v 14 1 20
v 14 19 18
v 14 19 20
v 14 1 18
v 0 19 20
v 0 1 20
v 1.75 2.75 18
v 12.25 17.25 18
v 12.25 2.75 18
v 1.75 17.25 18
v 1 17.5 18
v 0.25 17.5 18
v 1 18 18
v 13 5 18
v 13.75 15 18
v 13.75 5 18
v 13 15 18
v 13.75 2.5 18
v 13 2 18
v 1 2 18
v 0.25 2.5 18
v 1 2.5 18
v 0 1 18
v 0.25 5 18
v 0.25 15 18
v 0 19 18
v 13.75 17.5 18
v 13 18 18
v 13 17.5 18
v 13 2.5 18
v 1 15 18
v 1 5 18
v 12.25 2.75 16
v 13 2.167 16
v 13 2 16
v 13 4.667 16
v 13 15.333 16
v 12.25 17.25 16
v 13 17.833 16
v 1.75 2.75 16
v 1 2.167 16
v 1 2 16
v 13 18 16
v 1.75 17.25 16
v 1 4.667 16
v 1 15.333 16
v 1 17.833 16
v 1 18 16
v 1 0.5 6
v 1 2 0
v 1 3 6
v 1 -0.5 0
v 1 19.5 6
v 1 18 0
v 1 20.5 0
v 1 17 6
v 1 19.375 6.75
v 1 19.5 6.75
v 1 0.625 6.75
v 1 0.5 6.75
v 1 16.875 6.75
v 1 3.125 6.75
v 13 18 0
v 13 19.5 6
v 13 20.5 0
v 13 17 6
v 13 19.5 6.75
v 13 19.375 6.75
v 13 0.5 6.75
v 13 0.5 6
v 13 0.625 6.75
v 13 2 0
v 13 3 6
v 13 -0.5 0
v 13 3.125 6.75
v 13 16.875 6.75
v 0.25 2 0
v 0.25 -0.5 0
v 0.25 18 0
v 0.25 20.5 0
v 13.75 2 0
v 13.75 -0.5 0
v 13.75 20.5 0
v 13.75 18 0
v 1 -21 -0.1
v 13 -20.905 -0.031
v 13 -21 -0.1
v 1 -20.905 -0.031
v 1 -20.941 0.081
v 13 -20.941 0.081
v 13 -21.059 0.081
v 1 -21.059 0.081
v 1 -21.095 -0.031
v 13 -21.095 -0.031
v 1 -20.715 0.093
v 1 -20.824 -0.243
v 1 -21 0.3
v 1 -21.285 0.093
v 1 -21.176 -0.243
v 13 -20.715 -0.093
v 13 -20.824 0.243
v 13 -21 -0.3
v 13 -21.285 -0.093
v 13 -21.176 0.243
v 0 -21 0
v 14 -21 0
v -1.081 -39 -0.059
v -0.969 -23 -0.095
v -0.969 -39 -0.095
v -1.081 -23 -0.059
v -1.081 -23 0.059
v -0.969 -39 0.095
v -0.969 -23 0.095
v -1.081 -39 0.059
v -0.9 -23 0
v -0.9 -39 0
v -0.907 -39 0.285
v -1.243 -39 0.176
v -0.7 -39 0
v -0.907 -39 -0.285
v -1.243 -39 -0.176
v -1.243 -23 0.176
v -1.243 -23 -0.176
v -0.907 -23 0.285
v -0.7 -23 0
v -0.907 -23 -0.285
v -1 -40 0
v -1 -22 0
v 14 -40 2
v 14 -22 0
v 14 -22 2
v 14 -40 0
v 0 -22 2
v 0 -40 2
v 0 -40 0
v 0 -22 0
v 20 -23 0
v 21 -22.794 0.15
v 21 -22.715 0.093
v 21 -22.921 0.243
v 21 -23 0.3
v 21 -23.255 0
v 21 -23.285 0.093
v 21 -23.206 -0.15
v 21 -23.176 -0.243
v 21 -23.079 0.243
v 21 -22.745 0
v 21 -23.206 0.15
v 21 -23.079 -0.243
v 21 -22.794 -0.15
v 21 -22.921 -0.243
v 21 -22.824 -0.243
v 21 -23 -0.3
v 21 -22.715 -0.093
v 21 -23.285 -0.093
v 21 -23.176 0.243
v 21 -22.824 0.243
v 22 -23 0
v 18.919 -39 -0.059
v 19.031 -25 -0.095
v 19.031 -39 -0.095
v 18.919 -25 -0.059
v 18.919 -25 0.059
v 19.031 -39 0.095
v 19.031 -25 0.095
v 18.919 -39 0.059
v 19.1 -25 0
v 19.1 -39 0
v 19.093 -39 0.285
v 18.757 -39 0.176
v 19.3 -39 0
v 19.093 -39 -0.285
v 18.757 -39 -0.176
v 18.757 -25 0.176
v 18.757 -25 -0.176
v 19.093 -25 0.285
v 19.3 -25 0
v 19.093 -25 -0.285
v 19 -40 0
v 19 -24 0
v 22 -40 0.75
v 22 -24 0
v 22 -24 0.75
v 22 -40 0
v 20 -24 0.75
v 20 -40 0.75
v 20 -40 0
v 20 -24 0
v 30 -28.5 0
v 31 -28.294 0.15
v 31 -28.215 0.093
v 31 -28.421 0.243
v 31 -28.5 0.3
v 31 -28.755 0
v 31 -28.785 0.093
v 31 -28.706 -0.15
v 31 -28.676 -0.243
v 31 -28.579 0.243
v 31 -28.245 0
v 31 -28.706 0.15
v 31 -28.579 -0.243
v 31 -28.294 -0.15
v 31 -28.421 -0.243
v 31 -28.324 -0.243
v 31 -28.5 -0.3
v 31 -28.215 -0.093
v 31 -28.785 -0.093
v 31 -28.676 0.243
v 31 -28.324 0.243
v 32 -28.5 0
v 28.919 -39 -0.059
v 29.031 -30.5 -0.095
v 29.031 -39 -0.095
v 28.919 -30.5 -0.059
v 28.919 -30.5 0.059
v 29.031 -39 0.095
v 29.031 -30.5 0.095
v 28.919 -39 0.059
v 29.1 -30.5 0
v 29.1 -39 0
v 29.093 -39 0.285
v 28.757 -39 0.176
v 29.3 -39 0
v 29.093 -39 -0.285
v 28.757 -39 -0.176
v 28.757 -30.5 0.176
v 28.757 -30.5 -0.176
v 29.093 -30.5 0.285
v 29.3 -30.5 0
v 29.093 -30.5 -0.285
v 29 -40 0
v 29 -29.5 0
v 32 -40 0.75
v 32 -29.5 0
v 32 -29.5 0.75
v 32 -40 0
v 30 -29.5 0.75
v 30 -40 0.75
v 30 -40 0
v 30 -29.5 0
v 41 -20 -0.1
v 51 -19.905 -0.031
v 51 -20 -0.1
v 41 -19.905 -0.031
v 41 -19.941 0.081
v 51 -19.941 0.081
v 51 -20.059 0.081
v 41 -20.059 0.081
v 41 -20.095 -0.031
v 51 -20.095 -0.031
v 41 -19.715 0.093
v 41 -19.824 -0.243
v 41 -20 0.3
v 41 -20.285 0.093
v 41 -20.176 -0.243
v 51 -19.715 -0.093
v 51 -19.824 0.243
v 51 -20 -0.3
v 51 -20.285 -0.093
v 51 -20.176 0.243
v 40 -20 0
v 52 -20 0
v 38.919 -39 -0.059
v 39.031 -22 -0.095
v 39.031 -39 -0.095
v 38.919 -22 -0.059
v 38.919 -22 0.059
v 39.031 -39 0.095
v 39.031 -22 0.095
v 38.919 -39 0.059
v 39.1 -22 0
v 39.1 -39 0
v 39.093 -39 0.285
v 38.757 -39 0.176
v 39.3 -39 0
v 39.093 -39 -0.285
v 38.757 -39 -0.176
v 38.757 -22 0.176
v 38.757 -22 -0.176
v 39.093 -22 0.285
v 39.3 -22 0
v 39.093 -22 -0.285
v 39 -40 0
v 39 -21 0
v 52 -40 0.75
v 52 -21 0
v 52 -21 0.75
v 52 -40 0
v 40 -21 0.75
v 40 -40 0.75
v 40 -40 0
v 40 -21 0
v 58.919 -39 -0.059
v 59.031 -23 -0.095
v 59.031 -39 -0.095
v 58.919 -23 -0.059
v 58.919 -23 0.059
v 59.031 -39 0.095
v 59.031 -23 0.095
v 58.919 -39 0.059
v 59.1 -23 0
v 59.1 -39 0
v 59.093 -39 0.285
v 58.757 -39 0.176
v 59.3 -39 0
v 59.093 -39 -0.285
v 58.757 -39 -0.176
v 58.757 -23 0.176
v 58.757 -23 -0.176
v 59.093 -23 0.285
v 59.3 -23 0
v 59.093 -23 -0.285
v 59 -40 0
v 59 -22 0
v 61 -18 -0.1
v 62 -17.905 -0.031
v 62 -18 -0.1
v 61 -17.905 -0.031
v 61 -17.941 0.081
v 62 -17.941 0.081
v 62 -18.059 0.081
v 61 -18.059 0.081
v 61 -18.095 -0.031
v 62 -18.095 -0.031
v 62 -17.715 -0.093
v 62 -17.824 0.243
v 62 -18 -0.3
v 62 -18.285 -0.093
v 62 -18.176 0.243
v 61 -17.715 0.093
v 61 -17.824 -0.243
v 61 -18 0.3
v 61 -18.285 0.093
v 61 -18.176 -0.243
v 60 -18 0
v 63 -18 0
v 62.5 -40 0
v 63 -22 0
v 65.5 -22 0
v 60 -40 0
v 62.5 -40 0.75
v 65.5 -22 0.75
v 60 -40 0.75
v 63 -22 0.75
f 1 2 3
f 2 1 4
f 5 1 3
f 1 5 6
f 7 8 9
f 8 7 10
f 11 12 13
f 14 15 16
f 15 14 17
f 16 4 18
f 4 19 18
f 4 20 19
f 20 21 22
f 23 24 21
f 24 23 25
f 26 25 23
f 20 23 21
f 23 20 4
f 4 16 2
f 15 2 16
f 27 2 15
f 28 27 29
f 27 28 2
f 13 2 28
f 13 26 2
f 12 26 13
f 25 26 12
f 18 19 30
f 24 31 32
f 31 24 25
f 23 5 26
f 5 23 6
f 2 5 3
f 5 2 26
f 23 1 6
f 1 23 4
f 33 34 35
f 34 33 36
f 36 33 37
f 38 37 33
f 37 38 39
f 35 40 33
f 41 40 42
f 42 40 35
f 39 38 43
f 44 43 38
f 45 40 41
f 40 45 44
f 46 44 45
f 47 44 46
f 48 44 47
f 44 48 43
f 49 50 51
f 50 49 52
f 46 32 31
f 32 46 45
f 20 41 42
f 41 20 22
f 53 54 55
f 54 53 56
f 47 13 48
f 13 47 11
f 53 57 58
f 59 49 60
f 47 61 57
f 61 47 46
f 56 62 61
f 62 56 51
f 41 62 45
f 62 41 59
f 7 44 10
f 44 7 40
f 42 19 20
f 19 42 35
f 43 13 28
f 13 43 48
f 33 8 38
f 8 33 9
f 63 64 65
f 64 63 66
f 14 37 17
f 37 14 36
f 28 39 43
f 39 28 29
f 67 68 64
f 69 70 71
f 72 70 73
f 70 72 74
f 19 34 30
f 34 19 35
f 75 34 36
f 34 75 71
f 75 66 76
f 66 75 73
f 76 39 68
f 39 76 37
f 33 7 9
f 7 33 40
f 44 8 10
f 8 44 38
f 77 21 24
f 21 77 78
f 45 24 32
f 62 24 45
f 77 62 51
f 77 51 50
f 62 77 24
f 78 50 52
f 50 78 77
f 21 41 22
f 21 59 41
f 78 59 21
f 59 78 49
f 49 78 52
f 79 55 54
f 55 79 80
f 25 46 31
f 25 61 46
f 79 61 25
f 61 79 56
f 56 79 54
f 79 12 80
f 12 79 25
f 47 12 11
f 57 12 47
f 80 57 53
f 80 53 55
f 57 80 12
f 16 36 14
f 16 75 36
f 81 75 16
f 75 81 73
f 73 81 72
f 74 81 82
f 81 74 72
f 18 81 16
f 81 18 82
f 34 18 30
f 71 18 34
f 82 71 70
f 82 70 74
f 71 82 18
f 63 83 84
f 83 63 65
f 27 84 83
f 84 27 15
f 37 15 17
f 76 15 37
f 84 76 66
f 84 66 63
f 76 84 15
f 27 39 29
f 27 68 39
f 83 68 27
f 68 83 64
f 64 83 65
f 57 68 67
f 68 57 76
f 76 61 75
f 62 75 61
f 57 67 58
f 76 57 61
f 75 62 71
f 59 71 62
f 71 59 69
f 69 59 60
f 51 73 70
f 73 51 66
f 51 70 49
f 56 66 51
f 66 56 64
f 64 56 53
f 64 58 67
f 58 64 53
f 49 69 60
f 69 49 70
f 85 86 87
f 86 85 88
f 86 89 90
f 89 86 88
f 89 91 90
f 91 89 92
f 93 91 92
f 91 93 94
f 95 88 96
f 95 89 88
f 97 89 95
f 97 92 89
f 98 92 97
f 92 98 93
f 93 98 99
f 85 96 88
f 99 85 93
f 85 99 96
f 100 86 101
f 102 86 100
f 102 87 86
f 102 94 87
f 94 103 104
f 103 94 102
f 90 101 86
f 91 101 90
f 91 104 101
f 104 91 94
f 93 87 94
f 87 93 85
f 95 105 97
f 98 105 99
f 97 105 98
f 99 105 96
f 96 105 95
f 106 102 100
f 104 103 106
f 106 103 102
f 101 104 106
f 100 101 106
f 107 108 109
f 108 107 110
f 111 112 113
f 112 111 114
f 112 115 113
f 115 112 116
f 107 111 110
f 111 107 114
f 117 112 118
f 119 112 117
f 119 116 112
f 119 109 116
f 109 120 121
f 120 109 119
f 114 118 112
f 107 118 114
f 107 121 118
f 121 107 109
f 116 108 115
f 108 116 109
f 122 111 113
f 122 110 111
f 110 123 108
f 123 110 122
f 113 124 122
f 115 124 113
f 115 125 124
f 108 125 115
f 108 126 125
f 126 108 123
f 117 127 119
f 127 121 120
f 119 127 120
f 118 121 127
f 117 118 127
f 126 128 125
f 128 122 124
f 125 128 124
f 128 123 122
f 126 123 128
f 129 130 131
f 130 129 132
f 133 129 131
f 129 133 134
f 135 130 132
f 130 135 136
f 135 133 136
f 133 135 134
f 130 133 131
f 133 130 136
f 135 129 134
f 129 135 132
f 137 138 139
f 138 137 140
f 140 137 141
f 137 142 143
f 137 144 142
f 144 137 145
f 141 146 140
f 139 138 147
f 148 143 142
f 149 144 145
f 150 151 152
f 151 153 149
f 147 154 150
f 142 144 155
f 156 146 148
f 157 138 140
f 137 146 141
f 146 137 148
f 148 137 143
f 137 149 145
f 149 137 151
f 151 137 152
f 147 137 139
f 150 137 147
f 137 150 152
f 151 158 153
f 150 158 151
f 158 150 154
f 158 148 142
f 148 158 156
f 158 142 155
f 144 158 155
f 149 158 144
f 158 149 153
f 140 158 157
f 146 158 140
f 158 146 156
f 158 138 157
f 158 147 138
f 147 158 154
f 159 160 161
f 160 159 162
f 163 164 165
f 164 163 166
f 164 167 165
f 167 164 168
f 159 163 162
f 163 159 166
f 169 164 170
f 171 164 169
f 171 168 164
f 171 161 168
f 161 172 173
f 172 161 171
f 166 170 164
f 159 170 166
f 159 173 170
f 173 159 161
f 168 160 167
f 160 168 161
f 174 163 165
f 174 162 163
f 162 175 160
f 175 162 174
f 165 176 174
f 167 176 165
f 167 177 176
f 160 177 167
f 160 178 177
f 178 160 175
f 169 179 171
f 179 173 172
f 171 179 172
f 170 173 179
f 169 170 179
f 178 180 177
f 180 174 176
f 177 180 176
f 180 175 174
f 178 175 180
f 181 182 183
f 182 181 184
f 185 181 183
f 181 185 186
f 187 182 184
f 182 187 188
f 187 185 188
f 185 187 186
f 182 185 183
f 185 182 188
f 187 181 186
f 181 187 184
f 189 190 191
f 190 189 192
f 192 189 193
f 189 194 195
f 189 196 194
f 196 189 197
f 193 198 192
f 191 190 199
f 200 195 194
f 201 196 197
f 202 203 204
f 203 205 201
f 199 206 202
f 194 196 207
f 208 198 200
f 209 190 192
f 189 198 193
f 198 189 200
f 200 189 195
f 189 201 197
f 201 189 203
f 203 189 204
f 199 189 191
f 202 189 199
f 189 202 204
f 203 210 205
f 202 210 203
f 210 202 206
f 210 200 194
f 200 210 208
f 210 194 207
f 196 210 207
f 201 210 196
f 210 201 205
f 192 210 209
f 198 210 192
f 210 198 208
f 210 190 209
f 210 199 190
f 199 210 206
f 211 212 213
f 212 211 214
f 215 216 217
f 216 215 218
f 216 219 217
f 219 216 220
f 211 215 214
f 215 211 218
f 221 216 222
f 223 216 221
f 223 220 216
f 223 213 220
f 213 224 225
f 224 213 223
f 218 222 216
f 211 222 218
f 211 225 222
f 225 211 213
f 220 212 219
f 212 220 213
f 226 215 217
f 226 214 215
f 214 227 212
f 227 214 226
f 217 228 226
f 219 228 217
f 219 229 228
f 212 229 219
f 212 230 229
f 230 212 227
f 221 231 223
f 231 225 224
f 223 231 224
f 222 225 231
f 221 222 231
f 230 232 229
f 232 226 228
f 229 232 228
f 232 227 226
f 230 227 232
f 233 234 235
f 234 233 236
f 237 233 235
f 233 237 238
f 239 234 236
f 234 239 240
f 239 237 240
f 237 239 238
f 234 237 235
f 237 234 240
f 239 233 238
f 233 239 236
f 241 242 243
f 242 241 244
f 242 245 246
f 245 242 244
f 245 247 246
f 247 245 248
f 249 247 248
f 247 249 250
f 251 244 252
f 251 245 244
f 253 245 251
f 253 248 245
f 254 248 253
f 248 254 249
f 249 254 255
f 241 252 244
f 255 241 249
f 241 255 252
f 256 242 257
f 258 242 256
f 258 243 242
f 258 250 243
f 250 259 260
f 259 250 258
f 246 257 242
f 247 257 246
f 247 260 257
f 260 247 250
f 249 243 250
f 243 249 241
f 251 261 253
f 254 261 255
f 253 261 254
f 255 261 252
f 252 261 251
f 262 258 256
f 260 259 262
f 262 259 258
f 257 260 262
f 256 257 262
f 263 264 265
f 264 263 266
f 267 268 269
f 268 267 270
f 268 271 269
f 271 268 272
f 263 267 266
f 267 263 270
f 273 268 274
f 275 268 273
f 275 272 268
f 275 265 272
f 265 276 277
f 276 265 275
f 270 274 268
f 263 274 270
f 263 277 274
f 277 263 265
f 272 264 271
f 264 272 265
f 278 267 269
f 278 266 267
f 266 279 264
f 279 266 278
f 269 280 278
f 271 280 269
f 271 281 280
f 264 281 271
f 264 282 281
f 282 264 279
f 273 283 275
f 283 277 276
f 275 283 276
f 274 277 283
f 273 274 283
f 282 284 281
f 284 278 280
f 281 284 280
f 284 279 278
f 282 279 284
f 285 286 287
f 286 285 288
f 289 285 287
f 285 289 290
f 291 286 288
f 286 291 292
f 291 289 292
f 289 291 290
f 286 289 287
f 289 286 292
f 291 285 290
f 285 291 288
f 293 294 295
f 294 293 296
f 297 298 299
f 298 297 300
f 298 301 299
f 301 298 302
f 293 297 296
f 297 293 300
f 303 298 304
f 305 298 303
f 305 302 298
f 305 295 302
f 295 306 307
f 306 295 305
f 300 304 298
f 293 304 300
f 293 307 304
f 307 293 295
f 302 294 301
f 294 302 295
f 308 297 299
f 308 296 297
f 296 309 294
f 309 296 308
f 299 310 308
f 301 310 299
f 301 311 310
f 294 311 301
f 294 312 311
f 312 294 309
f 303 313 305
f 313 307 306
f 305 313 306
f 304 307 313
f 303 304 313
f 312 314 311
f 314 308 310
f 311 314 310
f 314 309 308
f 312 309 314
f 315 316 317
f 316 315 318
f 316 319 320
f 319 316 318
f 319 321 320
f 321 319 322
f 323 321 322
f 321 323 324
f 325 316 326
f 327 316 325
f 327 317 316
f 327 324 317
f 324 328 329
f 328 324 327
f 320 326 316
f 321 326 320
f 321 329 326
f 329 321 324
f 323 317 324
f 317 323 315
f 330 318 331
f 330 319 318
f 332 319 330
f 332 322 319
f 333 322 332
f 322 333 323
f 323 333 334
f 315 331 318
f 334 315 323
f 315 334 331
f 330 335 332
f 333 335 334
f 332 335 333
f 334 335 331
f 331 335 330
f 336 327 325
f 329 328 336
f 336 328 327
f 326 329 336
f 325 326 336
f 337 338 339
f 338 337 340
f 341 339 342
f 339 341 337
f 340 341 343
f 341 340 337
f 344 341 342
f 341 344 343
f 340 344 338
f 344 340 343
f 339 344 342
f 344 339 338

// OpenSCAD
// file: ../lib/common.scad
//--------------------------------------------------------------------------------------------------
// Module Prism
//--------------------------------------------------------------------------------------------------
module prism(z, y, x)
{
    rotate([0, 90, 0])
    {
        polyhedron(
                points=[[0,0,0], [x,0,0], [x,y,0], [0,y,0], [0,y,z], [x,y,z]],
                faces=[[0,1,2,3],[5,4,3,2],[0,4,5,1],[0,3,4],[5,2,1]]);
    }
    
}

//--------------------------------------------------------------------------------------------------
// Module Side panel
//--------------------------------------------------------------------------------------------------
module rect_cut(x, y, z, dx, dy)
{
    // Top panel
    translate([0, dy, 0])
    {
        cube([x, y - dy, z]);
    };

    // Left bottom panel
    translate([0, 0, 0])
    {
        cube([dx, dy, z]);
    };

    // Triangle
    translate([dx, 0, 0])
    {
        rotate([0, 0, 0])
        {
            prism(x - dx, dy, -z);
        }
    };
}

//--------------------------------------------------------------------------------------------------
// X dimensional arrow
//--------------------------------------------------------------------------------------------------
module arrow_x(l)
{
    line_w = 0.1;
    arrow_w = 1;
    arrow_h = 0.3;

    // Line
    translate([l / 2, 0, 0])
    {
        rotate([0, 90, 0])
        {
            color([0.4, 0.4, 0.4])
            cylinder(l - arrow_w * 2, line_w, line_w, true);
        }
    }

    // Left arrow
    translate([arrow_w, 0, 0])
    {
        rotate([0, 270, 0])
        {
            color([0.4, 0.4, 0.4])
            cylinder(arrow_w, arrow_h, 0, false);
        }
    }

    // Right arrow
    translate([l - arrow_w, 0, 0])
    {
        rotate([0, 90, 0])
        {
            color([0.4, 0.4, 0.4])
            cylinder(arrow_w, arrow_h, 0, false);
        }
    }

    // Text
    translate([l/3, 0.5, 0])
    {
        color([0.4, 0.4, 0.4])
        text(str(l), size=1);
    }
}

//--------------------------------------------------------------------------------------------------
// Y dimensional arrow
//--------------------------------------------------------------------------------------------------
module arrow_y(l)
{
    line_w = 0.1;
    arrow_w = 1;
    arrow_h = 0.3;

    // Line
    translate([0, l / 2, 0])
    {
        rotate([90, 0, 00])
        {
            color([0.4, 0.4, 0.4])
            cylinder(l - arrow_w * 2, line_w, line_w, true);
        }
    }

    // Left arrow
    translate([0 ,arrow_w, 0])
    {
        rotate([90, 0, 0])
        {
            color([0.4, 0.4, 0.4])
            cylinder(arrow_w, arrow_h, 0, false);
        }
    }

    // Right arrow
    translate([0, l - arrow_w, 0])
    {
        rotate([270, 0, 0])
        {
            color([0.4, 0.4, 0.4])
            cylinder(arrow_w, arrow_h, 0, false);
        }
    }

    // Text
    translate([-0.5, l/3, 0])
    {
        rotate([0 ,0, 90])
        {
            color([0.4, 0.4, 0.4])
            text(str(l), size=1);
        }
    }
}

//--------------------------------------------------------------------------------------------------
// parallelogram
//--------------------------------------------------------------------------------------------------
module parallelogram(x = 12, y = 12, z = 1, xd = 0)
{
    points = [
        [0, 0, 0 ],        //0
        [x, 0, 0 ],        //1
        [x + xd, y, 0],    //2
        [xd, y, 0 ],       //3
        [0, 0, z ],        //4
        [x, 0, z ],        //5
        [x + xd, y, z ],   //6
        [xd, y, z ]];      //7

    faces = [
        [0,1,2,3],         // bottom
        [4,5,1,0],         // front
        [7,6,5,4],         // top
        [5,6,2,1],         // right
        [6,7,3,2],         // back
        [7,4,0,3]];        // left

    polyhedron(points, faces);
}
// main file
include <../lib/common.scad>


//--------------------------------------------------------------------------------------------------
module top_board()
{
    color([0, 0, 1])
    cube([14, 18, 2]);
}

//--------------------------------------------------------------------------------------------------
module support_x()
{
    color([1, 1, 0])
    cube([2, 16, 0.75]);
}

//--------------------------------------------------------------------------------------------------
module support_y()
{
    color([1, 0, 1])
    cube([2, 10.5, 0.75]);
}

//--------------------------------------------------------------------------------------------------
module mid_panel()
{
    color([0, 1, 1])
    cube([12, 19, 0.75]);
}

//--------------------------------------------------------------------------------------------------
module leg()
{
    color([1, 0, 0])
    parallelogram(2.5, 18, 0.75, 3);
}


//--------------------------------------------------------------------------------------------------
// Render
//--------------------------------------------------------------------------------------------------
translate([0, 0, 0])
{
    //----------------------------------------------------------------------------------------------
    // Top board
    //----------------------------------------------------------------------------------------------
    translate([0, 1, 18])
    {
        rotate([0, 0, 0])
        {
            top_board();
        }
    };

    // Support x1
    translate([1.75, 2, 16])
    {
        rotate([0, -90, 0])
        {
            support_x();
        }
    }

    // Support x2
    translate([13, 2, 16])
    {
        rotate([0, -90, 0])
        {
            support_x();
        }
    }

    // Support y1
    translate([1.75, 2, 16])
    {
        rotate([0, -90, -90])
        {
            support_y();
        }
    }

    // Support y2
    translate([1.75, 17.25, 16])
    {
        rotate([0, -90, -90])
        {
            support_y();
        }
    }

    // Leg 1
    translate([0.25, -0.5, 0])
    {
        rotate([90, 0, 90])
        {
            leg();
        }
    }

    // Leg 2
    translate([1, 20.5, 0])
    {
        rotate([90, 0, 270])
        {
            leg();
        }
    }

    // Leg 3
    translate([13, -0.5, 0])
    {
        rotate([90, 0, 90])
        {
            leg();
        }
    }

    // Leg 4
    translate([13.75, 20.5, 0])
    {
        rotate([90, 0, 270])
        {
            leg();
        }
    }

    //----------------------------------------------------------------------------------------------
    // Mid panel
    //----------------------------------------------------------------------------------------------
    translate([1, 0.5, 6])
    {
        rotate([0, 0, 0])
        {
            mid_panel();
        }
    };
}


//--------------------------------------------------------------------------------------------------
// Draw Parts
//--------------------------------------------------------------------------------------------------
translate([0, -40, 0])
{
    //----------------------------------------------------------------------------------------------
    // Top board
    translate([0, 0, 0])
    {
        top_board();

        translate([0, 19, 0])
        {
            arrow_x(14);
        };

        translate([-1, 0, 0])
        {
            arrow_y(18);
        };
    };

    // Support X
    translate([20, 0, 0])
    {
        support_x();

        translate([0, 17, 0])
        {
            arrow_x(2);
        };

        translate([-1, 0, 0])
        {
            arrow_y(16);
        };
    };

    // Support Y
    translate([30, 0, 0])
    {
        support_y();

        translate([0, 11.5, 0])
        {
            arrow_x(2);
        };

        translate([-1, 0, 0])
        {
            arrow_y(10.5);
        };
    };

    // Mid panel
    translate([40, 0, 0])
    {
        mid_panel();

        translate([0, 20, 0])
        {
            arrow_x(12);
        };

        translate([-1, 0, 0])
        {
            arrow_y(19);
        };
    };

    // Leg
    translate([60, 0, 0])
    {
        leg();

        translate([0, 22, 0])
        {
            arrow_x(3);
        };

        translate([-1, 0, 0])
        {
            arrow_y(18);
        };
    };


}
